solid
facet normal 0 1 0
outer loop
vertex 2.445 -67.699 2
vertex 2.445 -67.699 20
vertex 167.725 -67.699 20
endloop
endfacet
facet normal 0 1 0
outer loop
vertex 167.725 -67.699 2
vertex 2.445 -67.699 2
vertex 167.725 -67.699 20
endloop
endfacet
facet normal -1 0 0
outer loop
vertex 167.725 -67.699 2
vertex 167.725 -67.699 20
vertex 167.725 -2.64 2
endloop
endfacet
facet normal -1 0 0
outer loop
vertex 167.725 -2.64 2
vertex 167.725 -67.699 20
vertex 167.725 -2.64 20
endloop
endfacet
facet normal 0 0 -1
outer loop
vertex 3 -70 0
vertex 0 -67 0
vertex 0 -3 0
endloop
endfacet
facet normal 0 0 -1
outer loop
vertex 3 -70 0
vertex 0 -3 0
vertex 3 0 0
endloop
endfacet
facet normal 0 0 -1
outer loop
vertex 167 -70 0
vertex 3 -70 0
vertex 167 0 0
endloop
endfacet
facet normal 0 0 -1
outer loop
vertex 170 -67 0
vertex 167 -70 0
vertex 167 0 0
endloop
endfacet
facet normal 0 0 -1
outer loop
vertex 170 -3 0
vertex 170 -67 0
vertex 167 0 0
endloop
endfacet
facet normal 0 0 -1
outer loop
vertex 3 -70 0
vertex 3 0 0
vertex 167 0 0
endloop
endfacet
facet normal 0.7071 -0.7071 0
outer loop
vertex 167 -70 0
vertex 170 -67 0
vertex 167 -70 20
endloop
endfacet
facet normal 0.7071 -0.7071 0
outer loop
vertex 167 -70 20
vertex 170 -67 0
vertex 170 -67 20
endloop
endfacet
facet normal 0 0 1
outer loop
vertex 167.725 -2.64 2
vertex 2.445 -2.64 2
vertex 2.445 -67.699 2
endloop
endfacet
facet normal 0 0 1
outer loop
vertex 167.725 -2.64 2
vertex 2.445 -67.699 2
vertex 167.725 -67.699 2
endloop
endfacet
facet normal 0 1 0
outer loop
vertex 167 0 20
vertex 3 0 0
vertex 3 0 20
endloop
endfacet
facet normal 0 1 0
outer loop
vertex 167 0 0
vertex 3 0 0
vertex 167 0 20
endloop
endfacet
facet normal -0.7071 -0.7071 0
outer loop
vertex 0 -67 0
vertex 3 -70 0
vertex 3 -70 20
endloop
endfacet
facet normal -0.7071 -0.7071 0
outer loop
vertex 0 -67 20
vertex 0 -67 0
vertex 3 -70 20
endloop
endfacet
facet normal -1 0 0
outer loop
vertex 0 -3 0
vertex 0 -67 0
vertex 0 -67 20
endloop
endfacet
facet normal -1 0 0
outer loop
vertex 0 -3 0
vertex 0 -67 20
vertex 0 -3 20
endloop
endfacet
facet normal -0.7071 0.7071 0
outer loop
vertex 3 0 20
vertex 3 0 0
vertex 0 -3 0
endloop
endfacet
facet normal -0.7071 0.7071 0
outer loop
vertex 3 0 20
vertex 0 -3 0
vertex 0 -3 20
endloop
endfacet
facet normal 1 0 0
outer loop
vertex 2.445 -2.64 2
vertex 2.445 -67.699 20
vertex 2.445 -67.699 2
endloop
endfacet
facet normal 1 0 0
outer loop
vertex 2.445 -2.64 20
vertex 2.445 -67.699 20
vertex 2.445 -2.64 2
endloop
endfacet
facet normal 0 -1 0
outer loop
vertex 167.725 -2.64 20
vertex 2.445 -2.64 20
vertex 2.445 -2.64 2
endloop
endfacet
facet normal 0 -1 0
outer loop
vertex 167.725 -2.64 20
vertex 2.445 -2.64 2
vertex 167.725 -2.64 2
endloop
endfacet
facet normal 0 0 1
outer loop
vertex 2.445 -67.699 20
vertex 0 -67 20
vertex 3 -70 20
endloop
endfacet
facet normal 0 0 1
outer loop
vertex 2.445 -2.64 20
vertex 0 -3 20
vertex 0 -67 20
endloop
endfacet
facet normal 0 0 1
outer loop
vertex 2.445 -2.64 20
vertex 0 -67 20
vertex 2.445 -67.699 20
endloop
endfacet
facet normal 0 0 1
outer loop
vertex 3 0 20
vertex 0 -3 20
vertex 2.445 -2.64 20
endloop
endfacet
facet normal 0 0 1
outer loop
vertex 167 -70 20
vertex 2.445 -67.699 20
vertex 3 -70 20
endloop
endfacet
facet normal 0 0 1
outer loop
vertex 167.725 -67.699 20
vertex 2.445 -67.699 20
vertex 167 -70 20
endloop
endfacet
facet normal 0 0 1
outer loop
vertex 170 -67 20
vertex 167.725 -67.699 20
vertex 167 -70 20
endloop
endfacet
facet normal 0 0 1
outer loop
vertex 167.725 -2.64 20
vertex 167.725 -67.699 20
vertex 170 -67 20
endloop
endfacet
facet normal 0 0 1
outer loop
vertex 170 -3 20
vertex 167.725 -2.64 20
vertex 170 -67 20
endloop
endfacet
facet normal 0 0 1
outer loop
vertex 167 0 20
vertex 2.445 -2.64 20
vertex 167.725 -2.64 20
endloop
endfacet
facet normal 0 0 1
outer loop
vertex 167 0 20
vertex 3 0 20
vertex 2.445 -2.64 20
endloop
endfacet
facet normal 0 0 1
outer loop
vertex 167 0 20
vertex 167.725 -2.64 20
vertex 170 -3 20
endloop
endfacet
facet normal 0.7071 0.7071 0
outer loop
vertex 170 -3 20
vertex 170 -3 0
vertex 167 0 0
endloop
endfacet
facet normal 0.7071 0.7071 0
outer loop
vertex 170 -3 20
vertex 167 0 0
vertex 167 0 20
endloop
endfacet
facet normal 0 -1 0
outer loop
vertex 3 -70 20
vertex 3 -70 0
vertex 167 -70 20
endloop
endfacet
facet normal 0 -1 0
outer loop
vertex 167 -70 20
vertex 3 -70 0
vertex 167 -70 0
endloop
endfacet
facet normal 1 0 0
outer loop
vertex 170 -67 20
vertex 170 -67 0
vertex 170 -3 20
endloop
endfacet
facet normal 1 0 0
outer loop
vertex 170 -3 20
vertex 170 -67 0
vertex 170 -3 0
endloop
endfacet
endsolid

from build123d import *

# Parameters (mm, degrees)
SKETCH1_W           = 170
SKETCH1_H           = 70
BOSS_EXTRUDE1_DEPTH = 20
SKETCH2_W           = 165.280045526
SKETCH2_H           = 65.058846286
CUT_EXTRUDE1_DEPTH  = 18
CHAMFER1_SIZE       = 3


with BuildPart() as part:
    # Sketch1 → Boss-Extrude1 (new body)
    with BuildSketch(Plane.XY):
        with Locations((85, -35)):
            Rectangle(SKETCH1_W, SKETCH1_H)
    extrude(amount=BOSS_EXTRUDE1_DEPTH)

    # Sketch2 → Cut-Extrude1 (cut)
    with BuildSketch(Plane.XY.offset(20)):
        with Locations((85.08493322, -35.169866439)):
            Rectangle(SKETCH2_W, SKETCH2_H)
    extrude(amount=-CUT_EXTRUDE1_DEPTH, mode=Mode.SUBTRACT)

    # Chamfer1
    chamfer1_edges = [part.edges().sort_by_distance(p)[0] for p in [
        (0, 0, 10),
        (170, 0, 10),
        (170, -70, 10),
        (0, -70, 10),
    ]]
    chamfer(chamfer1_edges, length=CHAMFER1_SIZE)


solid = part.part
